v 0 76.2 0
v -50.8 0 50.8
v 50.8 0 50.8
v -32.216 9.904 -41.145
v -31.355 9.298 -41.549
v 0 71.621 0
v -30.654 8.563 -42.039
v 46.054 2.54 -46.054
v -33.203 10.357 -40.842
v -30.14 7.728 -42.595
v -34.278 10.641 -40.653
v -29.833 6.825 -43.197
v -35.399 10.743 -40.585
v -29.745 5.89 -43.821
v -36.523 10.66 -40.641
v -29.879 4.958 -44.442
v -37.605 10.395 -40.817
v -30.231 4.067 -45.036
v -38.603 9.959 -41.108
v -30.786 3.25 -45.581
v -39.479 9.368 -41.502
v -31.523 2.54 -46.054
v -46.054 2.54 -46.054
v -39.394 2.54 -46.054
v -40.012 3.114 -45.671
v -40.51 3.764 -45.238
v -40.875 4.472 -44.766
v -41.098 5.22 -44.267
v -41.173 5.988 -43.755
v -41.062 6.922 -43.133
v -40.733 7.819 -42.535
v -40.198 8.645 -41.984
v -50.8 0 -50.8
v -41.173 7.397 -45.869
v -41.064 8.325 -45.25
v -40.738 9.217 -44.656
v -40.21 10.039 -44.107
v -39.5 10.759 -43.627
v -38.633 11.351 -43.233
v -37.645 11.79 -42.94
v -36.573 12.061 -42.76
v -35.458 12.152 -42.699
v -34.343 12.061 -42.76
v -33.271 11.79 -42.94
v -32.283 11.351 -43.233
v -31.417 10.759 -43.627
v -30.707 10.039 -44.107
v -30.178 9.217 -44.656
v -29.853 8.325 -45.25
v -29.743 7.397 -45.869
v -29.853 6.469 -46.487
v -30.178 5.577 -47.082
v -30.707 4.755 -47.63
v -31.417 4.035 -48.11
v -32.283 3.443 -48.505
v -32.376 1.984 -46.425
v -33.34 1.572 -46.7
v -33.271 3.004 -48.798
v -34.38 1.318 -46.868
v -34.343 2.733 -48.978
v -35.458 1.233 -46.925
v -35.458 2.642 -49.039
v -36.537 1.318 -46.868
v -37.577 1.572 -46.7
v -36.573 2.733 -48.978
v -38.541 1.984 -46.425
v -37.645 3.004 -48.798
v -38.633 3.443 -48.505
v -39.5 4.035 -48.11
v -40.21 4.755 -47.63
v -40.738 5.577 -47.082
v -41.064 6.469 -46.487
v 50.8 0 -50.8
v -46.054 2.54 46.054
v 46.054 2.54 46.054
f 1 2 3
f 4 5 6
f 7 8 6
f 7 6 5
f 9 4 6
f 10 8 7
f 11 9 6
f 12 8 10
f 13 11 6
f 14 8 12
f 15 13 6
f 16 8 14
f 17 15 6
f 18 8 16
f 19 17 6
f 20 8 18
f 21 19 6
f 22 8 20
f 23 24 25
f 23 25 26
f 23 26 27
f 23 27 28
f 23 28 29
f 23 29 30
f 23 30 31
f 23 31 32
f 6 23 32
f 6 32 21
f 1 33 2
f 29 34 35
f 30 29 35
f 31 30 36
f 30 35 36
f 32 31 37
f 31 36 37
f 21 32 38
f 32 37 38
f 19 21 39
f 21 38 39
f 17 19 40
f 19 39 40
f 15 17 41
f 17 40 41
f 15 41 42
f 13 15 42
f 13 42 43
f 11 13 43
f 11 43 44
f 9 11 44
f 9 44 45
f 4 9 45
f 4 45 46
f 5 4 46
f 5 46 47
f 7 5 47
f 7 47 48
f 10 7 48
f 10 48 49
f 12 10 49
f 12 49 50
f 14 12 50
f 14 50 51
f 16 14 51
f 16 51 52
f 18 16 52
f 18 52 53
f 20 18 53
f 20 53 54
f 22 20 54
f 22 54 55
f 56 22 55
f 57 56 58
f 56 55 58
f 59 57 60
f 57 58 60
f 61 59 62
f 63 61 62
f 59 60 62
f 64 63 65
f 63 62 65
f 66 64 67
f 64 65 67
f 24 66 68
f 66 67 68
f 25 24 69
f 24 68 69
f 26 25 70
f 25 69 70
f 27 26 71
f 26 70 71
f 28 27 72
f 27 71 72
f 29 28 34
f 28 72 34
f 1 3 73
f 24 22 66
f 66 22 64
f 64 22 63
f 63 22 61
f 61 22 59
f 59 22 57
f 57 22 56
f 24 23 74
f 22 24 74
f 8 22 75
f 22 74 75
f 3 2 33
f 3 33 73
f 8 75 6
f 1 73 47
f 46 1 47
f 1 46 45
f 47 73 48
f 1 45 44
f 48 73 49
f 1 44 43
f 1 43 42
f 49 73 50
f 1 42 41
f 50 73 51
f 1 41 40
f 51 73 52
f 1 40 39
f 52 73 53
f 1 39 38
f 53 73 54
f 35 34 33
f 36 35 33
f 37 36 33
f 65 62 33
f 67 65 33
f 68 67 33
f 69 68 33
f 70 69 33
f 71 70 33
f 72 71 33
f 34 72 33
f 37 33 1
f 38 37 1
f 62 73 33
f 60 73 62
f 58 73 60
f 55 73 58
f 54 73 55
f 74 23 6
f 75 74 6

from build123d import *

# Parameters (mm, degrees)
SHELL2_T            = -2.54
SKETCH8_W           = 95.49459984
SKETCH8_H           = 95.49459984
BOSS_EXTRUDE1_DEPTH = 2.54
SKETCH9_R           = 5.715
CUT_EXTRUDE1_DEPTH  = 2.54


with BuildPart() as part:
    # Sketch3 → Loft1 section 0
    with BuildSketch(Plane(origin=(0, 0, 0), x_dir=(1, 0, 0), z_dir=(0, 1, 0)), mode=Mode.PRIVATE) as loft1_s0:
        with BuildLine():
            Line((-50.8, -50.8), (50.8, -50.8))
            Line((50.8, -50.8), (50.8, 50.8))
            Line((50.8, 50.8), (-50.8, 50.8))
            Line((-50.8, 50.8), (-50.8, -50.8))
        make_face()
    loft([Vertex(0, 76.2, 0), loft1_s0.sketch])

    # Shell2
    shell2_openings = [part.faces().sort_by_distance(p)[0] for p in [
        (0, 0, 0),
    ]]
    offset(amount=SHELL2_T, openings=shell2_openings, kind=Kind.INTERSECTION)

    # Sketch8 → Boss-Extrude1 (add)
    with BuildSketch(Plane.XZ):
        Rectangle(SKETCH8_W, SKETCH8_H)
    extrude(amount=-BOSS_EXTRUDE1_DEPTH)

    # Sketch9 → Cut-Extrude1 (cut)
    with BuildSketch(Plane(origin=(0, 23.446153846, -35.169230769), x_dir=(-1, 0, 0), z_dir=(0, 0.5547001962252291, -0.8320502943378436))):
        with Locations((35.4584, -19.288769968)):
            Circle(SKETCH9_R)
    extrude(amount=-CUT_EXTRUDE1_DEPTH, mode=Mode.SUBTRACT)


solid = part.part
